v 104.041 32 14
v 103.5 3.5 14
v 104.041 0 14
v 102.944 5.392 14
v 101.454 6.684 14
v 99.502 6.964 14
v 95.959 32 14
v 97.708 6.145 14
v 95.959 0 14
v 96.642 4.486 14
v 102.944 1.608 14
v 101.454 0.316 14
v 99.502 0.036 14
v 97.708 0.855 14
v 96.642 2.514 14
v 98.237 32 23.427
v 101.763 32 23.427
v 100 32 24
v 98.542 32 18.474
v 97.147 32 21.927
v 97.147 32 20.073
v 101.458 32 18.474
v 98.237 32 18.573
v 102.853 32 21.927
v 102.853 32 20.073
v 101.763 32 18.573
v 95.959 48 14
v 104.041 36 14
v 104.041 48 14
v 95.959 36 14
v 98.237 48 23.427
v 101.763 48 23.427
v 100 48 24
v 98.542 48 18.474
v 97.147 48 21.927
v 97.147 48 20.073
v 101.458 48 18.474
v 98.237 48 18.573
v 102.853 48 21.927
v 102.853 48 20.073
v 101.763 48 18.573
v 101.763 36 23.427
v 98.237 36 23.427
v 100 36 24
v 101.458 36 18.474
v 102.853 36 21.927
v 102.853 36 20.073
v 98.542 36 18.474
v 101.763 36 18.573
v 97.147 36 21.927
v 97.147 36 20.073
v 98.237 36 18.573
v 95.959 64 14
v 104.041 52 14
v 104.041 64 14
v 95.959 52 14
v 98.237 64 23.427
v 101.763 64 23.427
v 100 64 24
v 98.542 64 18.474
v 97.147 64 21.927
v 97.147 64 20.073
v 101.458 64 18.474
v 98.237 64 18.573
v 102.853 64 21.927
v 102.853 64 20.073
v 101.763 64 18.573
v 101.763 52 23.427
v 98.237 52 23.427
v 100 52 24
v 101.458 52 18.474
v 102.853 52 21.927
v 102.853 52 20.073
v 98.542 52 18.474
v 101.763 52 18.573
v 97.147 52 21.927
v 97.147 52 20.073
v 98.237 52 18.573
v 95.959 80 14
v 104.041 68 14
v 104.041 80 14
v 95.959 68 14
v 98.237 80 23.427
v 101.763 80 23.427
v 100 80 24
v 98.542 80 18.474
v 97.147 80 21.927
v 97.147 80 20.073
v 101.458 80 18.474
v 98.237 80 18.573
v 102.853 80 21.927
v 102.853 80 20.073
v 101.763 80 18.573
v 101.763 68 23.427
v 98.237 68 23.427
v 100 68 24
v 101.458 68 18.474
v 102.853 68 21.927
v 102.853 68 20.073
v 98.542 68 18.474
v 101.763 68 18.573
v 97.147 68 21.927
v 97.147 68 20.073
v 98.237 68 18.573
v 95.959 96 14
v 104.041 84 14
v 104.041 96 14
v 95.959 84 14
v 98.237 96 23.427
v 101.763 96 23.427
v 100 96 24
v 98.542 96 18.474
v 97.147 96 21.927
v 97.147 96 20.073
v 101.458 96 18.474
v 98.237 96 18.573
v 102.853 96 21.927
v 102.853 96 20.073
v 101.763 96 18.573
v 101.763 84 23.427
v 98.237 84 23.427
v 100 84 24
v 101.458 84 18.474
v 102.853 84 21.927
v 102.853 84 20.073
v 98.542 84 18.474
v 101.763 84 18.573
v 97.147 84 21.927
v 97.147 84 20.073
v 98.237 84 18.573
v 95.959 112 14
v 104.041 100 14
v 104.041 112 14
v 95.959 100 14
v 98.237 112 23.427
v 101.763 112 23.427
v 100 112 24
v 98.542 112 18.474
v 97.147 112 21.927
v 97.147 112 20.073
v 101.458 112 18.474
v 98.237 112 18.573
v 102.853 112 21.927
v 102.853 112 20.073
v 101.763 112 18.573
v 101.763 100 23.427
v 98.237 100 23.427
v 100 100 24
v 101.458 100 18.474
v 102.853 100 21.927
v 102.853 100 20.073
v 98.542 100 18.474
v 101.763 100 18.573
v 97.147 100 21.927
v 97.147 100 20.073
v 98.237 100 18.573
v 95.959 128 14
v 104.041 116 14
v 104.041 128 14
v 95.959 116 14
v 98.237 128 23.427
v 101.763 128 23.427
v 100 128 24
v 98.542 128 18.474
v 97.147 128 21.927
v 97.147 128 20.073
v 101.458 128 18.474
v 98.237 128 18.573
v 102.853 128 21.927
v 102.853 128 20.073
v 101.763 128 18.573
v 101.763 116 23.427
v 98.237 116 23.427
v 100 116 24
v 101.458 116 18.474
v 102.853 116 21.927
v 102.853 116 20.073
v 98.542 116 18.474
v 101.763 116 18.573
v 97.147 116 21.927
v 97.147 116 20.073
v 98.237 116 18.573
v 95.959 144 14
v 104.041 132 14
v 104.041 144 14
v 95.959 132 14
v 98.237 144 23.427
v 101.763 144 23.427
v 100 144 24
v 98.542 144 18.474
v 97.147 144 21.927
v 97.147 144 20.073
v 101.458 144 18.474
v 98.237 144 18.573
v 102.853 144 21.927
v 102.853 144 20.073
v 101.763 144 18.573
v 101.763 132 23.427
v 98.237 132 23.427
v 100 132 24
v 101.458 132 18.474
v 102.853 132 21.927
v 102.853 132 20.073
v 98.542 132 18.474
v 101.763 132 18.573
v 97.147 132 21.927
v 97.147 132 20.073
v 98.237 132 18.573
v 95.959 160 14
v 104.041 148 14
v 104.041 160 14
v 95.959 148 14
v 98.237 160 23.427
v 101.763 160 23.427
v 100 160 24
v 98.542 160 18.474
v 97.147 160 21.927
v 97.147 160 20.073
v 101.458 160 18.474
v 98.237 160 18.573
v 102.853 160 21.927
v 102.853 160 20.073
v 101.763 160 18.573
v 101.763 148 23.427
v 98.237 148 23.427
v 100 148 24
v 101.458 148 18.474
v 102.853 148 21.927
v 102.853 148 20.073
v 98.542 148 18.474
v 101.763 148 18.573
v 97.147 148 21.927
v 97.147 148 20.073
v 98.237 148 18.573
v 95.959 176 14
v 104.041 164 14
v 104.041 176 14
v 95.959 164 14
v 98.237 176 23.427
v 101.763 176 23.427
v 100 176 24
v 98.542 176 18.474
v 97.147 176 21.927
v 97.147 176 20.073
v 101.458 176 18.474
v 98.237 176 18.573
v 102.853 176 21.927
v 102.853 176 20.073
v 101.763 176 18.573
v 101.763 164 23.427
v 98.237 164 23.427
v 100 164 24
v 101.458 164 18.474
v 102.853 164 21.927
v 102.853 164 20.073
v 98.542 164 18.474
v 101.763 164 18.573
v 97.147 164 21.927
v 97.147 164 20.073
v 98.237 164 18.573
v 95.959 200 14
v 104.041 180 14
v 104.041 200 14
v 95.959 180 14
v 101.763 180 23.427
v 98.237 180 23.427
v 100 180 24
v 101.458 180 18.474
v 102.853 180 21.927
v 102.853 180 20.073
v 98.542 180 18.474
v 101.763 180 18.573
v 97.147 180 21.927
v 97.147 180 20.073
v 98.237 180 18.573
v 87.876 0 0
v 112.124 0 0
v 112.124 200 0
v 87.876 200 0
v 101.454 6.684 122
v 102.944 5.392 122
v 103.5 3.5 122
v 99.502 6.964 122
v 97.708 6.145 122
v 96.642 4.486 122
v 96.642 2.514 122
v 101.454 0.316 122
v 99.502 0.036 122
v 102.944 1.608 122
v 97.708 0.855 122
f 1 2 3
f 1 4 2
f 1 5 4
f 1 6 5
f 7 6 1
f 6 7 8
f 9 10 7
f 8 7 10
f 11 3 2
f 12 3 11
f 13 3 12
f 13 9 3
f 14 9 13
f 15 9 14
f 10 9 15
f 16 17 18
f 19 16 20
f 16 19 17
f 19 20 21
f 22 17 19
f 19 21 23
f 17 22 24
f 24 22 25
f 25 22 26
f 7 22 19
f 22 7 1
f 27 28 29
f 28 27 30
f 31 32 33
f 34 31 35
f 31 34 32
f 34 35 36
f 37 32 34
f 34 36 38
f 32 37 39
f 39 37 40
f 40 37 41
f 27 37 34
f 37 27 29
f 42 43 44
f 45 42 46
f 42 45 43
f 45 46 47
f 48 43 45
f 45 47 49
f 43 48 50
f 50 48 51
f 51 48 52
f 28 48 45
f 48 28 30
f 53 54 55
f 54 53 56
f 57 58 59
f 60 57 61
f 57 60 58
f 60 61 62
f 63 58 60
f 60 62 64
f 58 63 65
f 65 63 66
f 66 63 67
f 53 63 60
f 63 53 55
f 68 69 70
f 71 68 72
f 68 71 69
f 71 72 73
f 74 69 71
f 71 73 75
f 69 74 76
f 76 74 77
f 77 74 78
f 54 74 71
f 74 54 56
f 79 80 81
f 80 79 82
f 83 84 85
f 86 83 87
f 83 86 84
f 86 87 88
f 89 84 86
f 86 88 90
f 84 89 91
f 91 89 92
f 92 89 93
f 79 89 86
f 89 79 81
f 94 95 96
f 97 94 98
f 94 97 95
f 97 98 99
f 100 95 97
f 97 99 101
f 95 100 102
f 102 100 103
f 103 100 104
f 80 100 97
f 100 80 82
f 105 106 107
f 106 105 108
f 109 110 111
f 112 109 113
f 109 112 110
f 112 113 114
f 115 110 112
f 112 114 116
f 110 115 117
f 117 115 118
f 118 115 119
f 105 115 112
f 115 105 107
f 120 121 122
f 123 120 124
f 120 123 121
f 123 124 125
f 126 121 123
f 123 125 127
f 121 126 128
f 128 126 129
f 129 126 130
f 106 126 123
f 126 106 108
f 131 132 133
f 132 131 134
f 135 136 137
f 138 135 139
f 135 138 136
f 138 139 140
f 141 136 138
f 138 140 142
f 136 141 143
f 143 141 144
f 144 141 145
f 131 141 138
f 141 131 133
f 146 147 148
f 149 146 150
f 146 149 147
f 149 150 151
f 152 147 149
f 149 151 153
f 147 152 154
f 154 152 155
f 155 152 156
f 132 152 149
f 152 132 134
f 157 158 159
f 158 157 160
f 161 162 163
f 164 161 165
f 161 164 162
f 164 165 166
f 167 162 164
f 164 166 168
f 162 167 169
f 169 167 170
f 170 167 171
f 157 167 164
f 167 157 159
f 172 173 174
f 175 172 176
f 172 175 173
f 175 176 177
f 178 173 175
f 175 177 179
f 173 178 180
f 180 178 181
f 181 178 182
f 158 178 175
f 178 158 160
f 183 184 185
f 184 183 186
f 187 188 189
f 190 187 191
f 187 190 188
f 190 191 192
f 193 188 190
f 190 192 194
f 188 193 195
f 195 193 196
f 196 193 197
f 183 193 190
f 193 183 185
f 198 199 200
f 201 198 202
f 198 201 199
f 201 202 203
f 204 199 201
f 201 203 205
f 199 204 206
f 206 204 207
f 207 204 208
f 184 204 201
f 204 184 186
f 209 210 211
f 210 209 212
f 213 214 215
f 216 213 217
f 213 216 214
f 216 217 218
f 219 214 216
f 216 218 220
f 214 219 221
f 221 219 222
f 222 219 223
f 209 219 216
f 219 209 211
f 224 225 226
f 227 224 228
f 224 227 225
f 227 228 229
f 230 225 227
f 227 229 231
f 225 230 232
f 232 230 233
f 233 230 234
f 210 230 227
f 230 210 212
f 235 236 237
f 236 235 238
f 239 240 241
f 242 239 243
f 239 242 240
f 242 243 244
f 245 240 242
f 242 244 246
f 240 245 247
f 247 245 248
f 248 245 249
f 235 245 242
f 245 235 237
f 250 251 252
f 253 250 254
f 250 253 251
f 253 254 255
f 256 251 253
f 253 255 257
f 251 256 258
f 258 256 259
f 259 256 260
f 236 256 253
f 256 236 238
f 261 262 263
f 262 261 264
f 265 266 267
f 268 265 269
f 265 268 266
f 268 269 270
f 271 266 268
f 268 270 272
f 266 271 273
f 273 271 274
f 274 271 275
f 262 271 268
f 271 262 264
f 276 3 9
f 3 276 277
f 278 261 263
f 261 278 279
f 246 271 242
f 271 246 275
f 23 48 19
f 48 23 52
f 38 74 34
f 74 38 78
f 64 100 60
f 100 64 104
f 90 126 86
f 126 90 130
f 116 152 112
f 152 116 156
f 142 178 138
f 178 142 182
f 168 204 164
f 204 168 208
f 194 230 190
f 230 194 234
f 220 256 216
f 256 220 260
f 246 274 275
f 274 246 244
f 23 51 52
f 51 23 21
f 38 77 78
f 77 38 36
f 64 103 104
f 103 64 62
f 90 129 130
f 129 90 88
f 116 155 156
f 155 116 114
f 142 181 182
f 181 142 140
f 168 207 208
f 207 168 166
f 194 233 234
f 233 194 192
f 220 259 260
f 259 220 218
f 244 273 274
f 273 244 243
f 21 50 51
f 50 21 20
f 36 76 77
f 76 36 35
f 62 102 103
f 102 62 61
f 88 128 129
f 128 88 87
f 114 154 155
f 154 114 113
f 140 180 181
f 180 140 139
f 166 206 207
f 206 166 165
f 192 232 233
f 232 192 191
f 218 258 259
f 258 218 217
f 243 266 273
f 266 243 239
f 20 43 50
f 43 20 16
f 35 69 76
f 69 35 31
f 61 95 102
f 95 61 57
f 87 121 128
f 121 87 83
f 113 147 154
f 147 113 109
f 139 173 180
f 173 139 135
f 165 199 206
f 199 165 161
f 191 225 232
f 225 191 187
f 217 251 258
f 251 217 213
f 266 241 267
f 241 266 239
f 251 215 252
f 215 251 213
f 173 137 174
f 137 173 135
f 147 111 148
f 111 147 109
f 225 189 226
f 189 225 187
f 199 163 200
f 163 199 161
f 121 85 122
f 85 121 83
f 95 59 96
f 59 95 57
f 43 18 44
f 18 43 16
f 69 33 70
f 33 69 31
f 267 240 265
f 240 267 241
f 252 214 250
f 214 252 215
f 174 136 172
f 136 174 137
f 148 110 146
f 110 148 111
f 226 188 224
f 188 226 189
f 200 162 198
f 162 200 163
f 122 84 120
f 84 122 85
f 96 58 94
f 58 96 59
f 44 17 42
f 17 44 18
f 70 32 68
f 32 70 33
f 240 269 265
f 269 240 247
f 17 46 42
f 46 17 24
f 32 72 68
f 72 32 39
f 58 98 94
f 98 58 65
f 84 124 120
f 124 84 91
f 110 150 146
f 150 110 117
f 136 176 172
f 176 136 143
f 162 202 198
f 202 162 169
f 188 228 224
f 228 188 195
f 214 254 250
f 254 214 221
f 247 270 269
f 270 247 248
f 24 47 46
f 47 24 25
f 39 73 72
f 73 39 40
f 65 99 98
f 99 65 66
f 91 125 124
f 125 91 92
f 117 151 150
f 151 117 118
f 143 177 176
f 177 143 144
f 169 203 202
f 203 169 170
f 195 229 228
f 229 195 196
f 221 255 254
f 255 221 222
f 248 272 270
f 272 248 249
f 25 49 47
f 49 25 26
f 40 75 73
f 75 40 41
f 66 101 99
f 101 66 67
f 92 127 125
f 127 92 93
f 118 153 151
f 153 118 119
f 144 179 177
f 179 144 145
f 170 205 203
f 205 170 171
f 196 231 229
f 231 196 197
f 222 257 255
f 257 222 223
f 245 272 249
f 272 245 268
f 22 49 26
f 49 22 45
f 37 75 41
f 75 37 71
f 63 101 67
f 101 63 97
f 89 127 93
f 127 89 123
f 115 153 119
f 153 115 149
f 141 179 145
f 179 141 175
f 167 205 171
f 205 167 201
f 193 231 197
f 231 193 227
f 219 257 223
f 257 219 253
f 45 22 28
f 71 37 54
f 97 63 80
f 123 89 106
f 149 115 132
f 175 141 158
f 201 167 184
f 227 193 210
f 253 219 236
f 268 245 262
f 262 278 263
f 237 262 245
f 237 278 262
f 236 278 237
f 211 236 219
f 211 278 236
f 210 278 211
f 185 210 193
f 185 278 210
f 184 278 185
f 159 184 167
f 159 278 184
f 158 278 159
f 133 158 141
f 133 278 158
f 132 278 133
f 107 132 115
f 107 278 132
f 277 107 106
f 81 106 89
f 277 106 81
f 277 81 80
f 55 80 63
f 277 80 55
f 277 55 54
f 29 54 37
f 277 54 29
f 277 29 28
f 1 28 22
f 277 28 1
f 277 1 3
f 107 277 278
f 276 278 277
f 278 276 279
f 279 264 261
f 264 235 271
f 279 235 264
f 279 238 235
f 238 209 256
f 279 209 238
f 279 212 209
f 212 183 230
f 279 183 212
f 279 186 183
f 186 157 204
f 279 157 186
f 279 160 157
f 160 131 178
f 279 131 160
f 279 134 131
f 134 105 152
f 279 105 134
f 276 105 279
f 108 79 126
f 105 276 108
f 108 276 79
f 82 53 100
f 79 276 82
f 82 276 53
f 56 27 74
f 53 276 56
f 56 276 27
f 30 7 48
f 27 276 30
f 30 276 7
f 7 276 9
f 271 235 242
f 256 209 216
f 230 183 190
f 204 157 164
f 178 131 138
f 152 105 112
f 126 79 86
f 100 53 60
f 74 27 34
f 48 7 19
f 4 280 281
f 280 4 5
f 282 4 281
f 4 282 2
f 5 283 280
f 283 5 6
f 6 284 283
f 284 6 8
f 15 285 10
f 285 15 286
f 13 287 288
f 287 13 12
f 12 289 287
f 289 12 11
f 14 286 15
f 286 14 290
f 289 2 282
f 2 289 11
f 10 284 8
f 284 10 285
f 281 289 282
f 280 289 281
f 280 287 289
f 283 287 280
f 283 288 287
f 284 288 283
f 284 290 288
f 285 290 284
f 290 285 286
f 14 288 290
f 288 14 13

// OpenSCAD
table_thickness = 20.5;
length = 50;
clamp = false;

if (clamp) {
    difference() {
        union() {
            // thumb
            translate([10, 0, 0]) {
                cube([20, length, 10]);
            }
            
            // back
            cube([40, 10, 10 + table_thickness + 15]);

            // top
            translate([0, 0, 10 + table_thickness]) {
                cube([40, length, 15]);
            }
            
            // hooks
            translate([5, 5, 10 + table_thickness + 15]) {
                cylinder(r=2.5,h=10);
            }
            translate([40-5, 5, 10 + table_thickness + 15]) {
                cylinder(r=2.5,h=10);
            }
        }
        translate([20,0, 7.5+10 + table_thickness]) {
            rotate([270,0,0]) {
                linear_extrude(height = length) {
                    rotate(270) {
                        circle(15,$fn=3);
                    }
                }
            }
        }
    }
}

// rail
translate([100,0,7]) {
    difference() {
        rotate([270,0,0]) {
            linear_extrude(height = 200) {
                rotate(270) {
                    circle(14,$fn=3);
                    translate([14, 0, 0]) {
                        circle(3);
                    }
                }
            }
        }

        translate([-7,0,7]) {
            cube([14, 20, 10]);
        }
        translate([-7,200-20,7]) {
            cube([14, 20, 10]);
        }
        
        for (x=[20:16:200-20]) {
            translate([-7,x,7]) {
                cube([14, 12, 10]);
            }
        }
    }
  
    // post
    translate([0,3.5,0]) {
        cylinder(r=3.5, h=115);
    }
}
